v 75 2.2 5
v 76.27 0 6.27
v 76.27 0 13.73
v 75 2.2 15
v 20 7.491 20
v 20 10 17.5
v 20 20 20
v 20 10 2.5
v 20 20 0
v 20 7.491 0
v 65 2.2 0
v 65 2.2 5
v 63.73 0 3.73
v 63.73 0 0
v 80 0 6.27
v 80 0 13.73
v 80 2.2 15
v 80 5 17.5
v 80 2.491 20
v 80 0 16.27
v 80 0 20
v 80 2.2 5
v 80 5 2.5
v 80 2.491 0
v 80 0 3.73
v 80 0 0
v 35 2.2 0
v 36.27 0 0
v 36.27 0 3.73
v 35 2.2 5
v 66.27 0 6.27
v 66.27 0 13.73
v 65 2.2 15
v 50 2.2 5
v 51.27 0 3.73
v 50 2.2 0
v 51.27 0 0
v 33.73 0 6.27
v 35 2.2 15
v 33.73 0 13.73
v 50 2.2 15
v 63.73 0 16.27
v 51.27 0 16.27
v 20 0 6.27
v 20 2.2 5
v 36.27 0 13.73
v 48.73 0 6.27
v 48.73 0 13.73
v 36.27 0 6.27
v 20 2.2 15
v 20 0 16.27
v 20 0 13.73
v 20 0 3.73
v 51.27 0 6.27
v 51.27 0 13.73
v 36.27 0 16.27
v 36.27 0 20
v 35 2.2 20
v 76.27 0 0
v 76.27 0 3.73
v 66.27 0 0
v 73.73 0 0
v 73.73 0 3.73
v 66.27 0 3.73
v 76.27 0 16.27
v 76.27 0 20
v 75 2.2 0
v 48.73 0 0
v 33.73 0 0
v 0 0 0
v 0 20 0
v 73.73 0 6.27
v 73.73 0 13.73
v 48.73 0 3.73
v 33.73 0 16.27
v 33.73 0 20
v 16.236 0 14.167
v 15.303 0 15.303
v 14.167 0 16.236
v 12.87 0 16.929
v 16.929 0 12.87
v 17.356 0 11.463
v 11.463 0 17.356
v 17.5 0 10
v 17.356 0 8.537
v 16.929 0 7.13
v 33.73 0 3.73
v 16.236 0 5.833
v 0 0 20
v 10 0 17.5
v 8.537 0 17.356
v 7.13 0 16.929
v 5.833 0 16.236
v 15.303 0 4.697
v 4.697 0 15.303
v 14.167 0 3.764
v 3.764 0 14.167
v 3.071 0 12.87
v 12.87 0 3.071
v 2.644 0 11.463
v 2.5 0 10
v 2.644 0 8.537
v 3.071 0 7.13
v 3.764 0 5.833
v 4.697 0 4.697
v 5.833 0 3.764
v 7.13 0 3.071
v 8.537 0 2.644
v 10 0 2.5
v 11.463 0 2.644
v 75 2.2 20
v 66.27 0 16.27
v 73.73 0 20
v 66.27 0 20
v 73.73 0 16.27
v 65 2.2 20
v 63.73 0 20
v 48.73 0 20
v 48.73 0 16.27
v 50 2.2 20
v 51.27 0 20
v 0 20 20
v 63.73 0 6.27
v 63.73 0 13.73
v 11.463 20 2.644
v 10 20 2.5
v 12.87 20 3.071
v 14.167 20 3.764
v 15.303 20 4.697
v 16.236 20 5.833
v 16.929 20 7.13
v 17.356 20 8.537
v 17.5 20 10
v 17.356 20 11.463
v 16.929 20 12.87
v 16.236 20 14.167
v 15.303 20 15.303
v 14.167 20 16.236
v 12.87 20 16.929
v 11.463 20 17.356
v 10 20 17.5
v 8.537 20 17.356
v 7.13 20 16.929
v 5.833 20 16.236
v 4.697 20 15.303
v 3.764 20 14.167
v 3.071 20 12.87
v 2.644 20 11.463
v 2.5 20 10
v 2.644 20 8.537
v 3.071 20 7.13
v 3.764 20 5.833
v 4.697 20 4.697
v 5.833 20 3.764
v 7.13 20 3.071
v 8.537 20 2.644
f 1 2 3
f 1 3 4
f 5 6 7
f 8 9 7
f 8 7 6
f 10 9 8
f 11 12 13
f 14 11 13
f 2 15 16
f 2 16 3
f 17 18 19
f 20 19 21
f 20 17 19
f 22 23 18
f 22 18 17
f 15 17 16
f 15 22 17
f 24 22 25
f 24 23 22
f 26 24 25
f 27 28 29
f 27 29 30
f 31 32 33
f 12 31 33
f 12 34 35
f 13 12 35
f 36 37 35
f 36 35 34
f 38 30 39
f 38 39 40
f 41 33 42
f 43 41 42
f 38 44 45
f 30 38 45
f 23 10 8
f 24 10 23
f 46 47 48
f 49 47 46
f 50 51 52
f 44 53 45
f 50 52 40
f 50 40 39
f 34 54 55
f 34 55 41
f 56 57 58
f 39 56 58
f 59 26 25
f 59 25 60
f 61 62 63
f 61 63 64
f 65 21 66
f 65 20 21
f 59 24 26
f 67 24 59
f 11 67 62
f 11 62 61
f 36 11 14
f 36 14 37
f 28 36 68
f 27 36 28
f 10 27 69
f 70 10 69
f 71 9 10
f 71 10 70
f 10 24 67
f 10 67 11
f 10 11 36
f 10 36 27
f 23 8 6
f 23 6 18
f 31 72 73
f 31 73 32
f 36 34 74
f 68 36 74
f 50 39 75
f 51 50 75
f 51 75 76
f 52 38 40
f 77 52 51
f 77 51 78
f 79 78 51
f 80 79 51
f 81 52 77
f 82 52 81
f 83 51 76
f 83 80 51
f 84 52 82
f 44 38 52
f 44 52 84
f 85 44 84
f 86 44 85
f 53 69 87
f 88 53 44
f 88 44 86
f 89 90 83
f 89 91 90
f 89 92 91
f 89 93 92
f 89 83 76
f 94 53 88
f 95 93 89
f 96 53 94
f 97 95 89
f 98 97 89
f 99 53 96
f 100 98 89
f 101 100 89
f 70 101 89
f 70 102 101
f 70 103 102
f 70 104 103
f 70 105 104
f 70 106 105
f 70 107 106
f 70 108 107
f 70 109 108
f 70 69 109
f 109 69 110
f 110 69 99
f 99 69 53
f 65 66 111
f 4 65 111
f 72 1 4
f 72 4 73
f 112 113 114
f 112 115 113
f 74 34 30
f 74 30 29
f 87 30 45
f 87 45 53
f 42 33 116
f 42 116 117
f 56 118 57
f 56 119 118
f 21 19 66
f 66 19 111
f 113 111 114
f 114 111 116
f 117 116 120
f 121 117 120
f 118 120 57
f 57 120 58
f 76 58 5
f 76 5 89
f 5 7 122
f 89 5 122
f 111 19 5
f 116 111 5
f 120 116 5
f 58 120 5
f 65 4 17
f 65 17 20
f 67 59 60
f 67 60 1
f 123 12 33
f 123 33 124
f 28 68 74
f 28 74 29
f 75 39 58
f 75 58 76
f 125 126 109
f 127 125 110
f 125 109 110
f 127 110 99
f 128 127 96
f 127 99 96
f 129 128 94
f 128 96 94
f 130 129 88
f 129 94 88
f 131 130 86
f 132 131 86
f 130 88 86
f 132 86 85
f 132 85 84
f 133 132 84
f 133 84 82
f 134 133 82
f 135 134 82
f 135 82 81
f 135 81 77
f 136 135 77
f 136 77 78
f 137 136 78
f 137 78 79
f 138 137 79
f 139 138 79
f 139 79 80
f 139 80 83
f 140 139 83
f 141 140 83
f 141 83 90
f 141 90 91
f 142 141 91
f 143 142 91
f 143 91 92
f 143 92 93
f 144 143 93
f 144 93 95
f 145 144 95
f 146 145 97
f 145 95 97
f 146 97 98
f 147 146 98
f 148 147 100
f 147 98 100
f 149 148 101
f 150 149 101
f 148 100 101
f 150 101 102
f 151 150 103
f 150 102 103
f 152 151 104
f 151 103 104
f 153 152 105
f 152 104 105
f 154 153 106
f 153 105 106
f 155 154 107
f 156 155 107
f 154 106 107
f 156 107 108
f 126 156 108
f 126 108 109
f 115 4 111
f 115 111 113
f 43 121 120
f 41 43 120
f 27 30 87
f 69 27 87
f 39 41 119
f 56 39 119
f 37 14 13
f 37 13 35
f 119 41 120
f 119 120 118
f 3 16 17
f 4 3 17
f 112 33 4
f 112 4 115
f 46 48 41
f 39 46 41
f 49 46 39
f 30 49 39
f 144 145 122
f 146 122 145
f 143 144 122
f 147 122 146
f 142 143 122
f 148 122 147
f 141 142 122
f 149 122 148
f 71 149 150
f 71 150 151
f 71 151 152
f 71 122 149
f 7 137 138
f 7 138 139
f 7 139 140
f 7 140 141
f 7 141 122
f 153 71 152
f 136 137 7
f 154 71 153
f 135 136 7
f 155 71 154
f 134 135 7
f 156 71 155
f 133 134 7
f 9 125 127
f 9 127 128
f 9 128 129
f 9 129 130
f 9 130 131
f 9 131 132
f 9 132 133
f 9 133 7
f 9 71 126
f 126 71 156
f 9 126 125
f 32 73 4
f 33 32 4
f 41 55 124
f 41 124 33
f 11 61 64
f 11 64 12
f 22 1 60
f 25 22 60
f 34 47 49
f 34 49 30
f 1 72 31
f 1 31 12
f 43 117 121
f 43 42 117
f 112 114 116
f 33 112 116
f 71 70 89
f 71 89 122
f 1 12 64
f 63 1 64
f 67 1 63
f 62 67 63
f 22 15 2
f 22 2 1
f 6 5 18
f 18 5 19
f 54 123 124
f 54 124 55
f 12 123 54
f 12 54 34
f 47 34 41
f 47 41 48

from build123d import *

# Parameters (mm, degrees)
BOSS_EXTRUDE1_DEPTH = 20
CHAMFER1_SIZE       = 2.5
SKETCH2_R           = 7.5
CUT_EXTRUDE1_DEPTH  = 85.852813742
CUT_EXTRUDE2_DEPTH  = 60
CUT_EXTRUDE3_DEPTH  = 85.852813742


with BuildPart() as part:
    # Sketch1 → Boss-Extrude1 (new body)
    with BuildSketch(Plane.XY):
        Polygon((0, 0), (0, 20), (20, 20), (20, 10), (80, 5), (80, 0), align=None)
    extrude(amount=BOSS_EXTRUDE1_DEPTH)

    # Chamfer1
    chamfer1_edges = [part.edges().sort_by_distance(p)[0] for p in [
        (50, 7.5, 20),
        (50, 7.5, 0),
    ]]
    chamfer(chamfer1_edges, length=CHAMFER1_SIZE)

    # Sketch2 → Cut-Extrude1 (cut, through all)
    with BuildSketch(Plane(origin=(0, 0, 0), x_dir=(-1, 0, 0), z_dir=(0, -1, 0))):
        with Locations(Location((-10, -10, 0), (0, 0, 90))):
            Circle(SKETCH2_R)
    extrude(amount=-CUT_EXTRUDE1_DEPTH, mode=Mode.SUBTRACT)

    # Sketch3 → Cut-Extrude2 (cut)
    with BuildSketch(Plane(origin=(80, 0, 0), x_dir=(0, 0, -1), z_dir=(1, 0, 0))):
        Polygon((-15, 2.199704526), (-16.27, 0), (-13.73, 0), align=None)
        Polygon((-6.27, 0), (-5, 2.199704526), (-3.73, 0), align=None)
    extrude(amount=-CUT_EXTRUDE2_DEPTH, mode=Mode.SUBTRACT)

    # Sketch4 → Cut-Extrude3 (cut, through all)
    with BuildSketch(Plane.XY):
        Polygon((75, 2.199704526), (73.73, 0), (76.27, 0), align=None)
        Polygon((65, 2.199704526), (63.73, 0), (66.27, 0), align=None)
        Polygon((50, 2.199704526), (48.73, 0), (51.27, 0), align=None)
        Polygon((35, 2.199704526), (33.73, 0), (36.27, 0), align=None)
    extrude(amount=CUT_EXTRUDE3_DEPTH, mode=Mode.SUBTRACT)


solid = part.part
